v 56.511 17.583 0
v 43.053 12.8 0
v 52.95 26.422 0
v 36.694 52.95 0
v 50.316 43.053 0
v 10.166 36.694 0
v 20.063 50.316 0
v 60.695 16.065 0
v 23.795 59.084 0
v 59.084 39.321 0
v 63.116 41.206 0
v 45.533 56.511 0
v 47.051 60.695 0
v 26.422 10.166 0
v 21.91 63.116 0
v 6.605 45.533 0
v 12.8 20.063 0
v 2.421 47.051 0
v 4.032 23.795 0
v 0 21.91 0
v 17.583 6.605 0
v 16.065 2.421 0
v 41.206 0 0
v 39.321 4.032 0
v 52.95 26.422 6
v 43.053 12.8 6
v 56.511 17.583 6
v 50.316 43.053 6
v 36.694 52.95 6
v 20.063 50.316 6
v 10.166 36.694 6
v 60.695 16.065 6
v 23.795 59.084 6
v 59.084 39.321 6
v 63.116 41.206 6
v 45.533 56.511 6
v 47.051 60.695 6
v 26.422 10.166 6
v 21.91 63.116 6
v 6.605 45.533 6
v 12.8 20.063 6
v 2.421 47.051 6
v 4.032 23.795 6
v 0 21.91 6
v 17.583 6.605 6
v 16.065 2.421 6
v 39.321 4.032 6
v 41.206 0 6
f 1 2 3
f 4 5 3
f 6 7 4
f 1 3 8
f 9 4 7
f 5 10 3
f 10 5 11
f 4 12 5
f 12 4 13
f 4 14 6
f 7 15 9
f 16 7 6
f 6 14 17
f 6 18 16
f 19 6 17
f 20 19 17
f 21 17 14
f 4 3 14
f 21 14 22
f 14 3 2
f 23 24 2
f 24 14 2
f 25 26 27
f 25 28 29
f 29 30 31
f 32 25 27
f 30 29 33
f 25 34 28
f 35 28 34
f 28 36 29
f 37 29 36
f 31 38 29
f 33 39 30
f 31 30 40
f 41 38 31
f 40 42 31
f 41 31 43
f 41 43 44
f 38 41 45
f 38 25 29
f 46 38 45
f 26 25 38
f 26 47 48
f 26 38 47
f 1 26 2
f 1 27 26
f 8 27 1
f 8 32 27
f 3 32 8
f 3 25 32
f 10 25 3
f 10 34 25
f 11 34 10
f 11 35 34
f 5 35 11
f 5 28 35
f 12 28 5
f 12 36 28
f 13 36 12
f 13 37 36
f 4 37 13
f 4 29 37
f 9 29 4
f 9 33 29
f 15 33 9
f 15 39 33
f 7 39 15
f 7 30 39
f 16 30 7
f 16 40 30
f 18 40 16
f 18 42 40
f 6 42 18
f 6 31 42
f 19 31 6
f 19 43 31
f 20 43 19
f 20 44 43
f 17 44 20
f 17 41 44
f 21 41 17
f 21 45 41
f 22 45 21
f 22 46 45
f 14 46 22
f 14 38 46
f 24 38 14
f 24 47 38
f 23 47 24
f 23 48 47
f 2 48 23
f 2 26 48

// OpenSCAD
$fn = 32;

// ----------------------------------------------------------------------
// Fan rotor section: 8 blades, 22 mm hub radius, 11 mm blades
// ----------------------------------------------------------------------

// --- parameters (mm) ---
profile_height = 6;       // extrusion height
profile_points = 24;      // points of the closed outline

profile = [[52.95, 26.422], [59.084, 39.321], [63.116, 41.206], [50.316, 43.053], [45.533, 56.511], [47.051, 60.695], [36.694, 52.95], [23.795, 59.084], [21.91, 63.116], [20.063, 50.316], [6.605, 45.533], [2.421, 47.051], [10.166, 36.694], [4.032, 23.795], [0, 21.91], [12.8, 20.063], [17.583, 6.605], [16.065, 2.421], [26.422, 10.166], [39.321, 4.032], [41.206, 0], [43.053, 12.8], [56.511, 17.583], [60.695, 16.065]];  // single closed polygon, 24 points, counter clockwise

// --- the one profile operation ---
linear_extrude(height = profile_height) polygon(points = profile);
